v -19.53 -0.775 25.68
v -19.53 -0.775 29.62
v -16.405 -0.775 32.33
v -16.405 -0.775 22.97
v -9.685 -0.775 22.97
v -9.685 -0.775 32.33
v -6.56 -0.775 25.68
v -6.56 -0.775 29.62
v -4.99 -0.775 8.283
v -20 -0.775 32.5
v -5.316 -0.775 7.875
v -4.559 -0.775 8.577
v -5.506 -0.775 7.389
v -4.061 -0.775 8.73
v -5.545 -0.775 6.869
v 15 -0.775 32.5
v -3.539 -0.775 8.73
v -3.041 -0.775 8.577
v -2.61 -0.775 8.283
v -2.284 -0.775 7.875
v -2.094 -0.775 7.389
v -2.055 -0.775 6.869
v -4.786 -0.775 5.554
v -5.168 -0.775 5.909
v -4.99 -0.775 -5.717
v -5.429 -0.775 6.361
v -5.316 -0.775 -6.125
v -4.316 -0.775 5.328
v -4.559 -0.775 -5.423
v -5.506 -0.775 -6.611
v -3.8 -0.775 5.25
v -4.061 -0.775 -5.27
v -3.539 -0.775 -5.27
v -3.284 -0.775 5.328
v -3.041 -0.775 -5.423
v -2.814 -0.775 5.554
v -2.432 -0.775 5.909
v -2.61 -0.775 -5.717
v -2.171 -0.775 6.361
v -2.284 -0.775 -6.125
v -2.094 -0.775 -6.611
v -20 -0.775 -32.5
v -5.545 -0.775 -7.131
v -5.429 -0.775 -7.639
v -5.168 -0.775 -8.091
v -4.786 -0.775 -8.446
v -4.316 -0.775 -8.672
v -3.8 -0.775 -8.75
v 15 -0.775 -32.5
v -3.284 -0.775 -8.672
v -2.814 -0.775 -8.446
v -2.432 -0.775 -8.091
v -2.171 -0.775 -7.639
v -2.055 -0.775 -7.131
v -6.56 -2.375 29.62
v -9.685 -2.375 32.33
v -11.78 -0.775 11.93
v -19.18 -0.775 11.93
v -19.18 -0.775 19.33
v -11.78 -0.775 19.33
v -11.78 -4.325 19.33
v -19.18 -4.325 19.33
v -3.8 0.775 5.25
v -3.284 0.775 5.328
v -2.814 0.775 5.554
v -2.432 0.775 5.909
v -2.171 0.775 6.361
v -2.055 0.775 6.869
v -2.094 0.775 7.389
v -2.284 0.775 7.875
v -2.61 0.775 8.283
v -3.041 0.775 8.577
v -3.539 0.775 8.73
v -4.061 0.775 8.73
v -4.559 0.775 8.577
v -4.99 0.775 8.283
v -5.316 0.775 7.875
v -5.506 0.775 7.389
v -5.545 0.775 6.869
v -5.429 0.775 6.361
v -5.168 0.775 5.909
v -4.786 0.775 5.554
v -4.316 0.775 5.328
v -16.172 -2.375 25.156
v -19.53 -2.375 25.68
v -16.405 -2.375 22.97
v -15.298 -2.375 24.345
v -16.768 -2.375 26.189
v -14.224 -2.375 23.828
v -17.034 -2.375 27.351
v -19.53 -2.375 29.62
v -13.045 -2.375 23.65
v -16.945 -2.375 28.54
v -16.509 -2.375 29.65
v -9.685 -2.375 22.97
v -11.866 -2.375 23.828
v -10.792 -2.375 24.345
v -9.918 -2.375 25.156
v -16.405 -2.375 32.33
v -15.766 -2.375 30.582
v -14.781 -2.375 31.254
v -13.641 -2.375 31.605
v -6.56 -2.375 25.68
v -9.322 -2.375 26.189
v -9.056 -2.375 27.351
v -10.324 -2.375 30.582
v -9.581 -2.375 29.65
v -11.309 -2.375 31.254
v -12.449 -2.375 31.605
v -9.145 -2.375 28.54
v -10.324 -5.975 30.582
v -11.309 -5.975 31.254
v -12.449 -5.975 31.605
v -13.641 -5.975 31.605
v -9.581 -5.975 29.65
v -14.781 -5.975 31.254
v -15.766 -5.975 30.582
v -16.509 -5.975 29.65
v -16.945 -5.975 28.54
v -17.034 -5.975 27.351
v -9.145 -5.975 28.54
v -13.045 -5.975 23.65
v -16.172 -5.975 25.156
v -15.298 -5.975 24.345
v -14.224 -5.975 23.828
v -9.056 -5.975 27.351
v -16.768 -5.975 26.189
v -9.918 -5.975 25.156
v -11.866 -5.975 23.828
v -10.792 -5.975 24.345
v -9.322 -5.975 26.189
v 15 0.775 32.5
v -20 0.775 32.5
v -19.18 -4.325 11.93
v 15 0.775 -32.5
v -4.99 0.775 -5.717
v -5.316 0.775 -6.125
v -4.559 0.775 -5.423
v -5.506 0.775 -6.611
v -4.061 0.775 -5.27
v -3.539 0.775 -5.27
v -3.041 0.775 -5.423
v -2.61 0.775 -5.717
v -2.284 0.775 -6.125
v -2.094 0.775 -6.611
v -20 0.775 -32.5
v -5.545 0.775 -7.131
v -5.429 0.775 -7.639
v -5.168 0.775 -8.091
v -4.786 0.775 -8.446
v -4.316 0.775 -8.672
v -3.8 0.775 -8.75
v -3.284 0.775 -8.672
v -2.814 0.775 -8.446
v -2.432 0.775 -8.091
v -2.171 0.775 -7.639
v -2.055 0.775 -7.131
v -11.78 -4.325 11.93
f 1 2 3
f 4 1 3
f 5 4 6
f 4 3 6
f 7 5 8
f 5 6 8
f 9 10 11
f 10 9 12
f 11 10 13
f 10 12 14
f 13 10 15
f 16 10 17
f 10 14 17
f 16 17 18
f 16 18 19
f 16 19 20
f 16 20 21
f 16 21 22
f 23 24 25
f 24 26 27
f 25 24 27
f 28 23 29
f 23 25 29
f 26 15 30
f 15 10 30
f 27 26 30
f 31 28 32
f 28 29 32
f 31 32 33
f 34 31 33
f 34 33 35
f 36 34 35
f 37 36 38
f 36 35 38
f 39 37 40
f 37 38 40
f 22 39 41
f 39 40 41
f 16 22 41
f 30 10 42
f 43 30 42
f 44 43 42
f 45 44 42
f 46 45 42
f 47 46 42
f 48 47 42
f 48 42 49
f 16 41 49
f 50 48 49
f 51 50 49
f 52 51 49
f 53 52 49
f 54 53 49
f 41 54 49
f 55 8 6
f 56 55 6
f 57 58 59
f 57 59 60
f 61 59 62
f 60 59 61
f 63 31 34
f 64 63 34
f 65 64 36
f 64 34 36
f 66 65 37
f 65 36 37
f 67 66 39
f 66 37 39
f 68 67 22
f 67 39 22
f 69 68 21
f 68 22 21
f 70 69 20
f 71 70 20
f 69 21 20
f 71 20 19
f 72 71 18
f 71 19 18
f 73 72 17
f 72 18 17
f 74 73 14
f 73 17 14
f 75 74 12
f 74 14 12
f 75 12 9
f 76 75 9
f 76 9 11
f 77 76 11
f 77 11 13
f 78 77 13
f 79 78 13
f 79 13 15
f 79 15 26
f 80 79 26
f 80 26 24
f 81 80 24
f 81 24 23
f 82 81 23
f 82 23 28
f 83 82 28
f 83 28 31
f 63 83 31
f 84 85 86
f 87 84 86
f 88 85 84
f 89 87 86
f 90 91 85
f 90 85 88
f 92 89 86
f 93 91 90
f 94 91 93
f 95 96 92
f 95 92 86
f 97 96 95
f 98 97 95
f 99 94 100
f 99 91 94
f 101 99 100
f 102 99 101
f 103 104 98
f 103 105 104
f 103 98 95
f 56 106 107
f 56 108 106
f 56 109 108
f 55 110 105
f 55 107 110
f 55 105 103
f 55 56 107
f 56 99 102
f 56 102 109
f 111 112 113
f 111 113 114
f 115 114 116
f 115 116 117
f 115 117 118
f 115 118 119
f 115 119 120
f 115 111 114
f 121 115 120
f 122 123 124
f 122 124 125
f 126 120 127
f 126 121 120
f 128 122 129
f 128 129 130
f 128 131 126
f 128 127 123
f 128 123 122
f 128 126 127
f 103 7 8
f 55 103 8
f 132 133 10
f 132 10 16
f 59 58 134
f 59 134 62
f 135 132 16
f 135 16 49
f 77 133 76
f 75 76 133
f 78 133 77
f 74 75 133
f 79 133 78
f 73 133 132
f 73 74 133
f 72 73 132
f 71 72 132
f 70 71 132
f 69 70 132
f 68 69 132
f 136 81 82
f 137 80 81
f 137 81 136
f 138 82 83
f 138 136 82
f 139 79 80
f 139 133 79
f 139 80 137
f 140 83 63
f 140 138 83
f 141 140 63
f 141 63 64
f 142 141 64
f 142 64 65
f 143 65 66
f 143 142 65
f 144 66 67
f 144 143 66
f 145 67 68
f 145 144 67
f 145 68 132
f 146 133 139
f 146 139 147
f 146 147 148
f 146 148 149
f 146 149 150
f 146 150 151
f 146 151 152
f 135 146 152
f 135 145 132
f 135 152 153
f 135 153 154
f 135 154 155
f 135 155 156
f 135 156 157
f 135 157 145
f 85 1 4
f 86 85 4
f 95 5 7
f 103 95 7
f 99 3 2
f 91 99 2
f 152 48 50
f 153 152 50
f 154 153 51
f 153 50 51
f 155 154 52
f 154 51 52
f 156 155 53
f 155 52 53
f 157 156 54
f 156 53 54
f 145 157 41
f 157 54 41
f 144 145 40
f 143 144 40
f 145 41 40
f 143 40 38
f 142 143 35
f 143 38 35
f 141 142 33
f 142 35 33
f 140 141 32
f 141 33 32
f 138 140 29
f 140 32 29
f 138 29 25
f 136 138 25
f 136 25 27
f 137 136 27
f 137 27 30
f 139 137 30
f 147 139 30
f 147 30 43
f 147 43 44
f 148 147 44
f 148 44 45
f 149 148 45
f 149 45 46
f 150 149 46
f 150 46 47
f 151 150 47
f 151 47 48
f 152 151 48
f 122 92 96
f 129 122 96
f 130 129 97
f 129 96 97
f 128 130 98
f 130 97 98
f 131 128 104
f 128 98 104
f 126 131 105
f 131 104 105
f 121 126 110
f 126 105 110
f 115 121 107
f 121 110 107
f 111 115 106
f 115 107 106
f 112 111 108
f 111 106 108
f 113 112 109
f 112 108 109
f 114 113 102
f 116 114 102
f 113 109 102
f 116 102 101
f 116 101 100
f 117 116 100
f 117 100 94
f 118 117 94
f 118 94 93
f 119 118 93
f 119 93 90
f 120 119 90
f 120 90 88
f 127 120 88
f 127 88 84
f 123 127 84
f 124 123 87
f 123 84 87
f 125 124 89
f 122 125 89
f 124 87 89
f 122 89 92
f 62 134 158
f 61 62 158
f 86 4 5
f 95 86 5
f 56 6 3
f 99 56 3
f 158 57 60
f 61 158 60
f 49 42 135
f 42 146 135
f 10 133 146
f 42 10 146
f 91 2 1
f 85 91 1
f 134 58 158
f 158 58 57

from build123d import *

# Parameters (mm, degrees)
SKETCH1_W           = 35
SKETCH1_H           = 65
BOSS_EXTRUDE1_DEPTH = 0.775
SKETCH2_R           = 1.75
CUT_EXTRUDE1_DEPTH  = 39.192309435
SKETCH3_W           = 7.4
SKETCH3_H           = 7.4
BOSS_EXTRUDE2_DEPTH = 3.55
BOSS_EXTRUDE3_DEPTH = 1.6
SKETCH5_R           = 4
BOSS_EXTRUDE4_DEPTH = 3.6


with BuildPart() as part:
    # Sketch1 → Boss-Extrude1 (new, symmetric)
    with BuildSketch(Plane(origin=(0, 0, 0), x_dir=(1, 0, 0), z_dir=(0, 1, 0))):
        with Locations((-2.5, 0)):
            Rectangle(SKETCH1_W, SKETCH1_H)
    extrude(amount=BOSS_EXTRUDE1_DEPTH, both=True)

    # Sketch2 → Cut-Extrude1 (cut, through all)
    with BuildSketch(Plane.XZ.offset(0.775)):
        with Locations(Location((-3.8, 7, 0), (0, 0, 270))):
            Circle(SKETCH2_R)
        with Locations(Location((-3.8, -7, 0), (0, 0, 270))):
            Circle(SKETCH2_R)
    extrude(amount=-CUT_EXTRUDE1_DEPTH, mode=Mode.SUBTRACT)


with BuildPart() as body_2:
    # Sketch3 → Boss-Extrude2 (new body)
    with BuildSketch(Plane.XZ.offset(0.775)):
        with Locations((-15.48, 15.63)):
            Rectangle(SKETCH3_W, SKETCH3_H)
    extrude(amount=BOSS_EXTRUDE2_DEPTH)


with BuildPart() as body_3:
    # Sketch4 → Boss-Extrude3 (new body)
    with BuildSketch(Plane.XZ.offset(0.775)):
        Polygon((-19.53, 29.62), (-19.53, 25.68), (-16.405, 22.97), (-9.685, 22.97), (-6.56, 25.68), (-6.56, 29.62), (-9.685, 32.33), (-16.405, 32.33), align=None)
    extrude(amount=BOSS_EXTRUDE3_DEPTH)

    # Sketch5 → Boss-Extrude4 (add)
    with BuildSketch(Plane.XZ.offset(2.375)):
        with Locations(Location((-13.045, 27.65, 0), (0, 0, 270))):
            Circle(SKETCH5_R)
    extrude(amount=BOSS_EXTRUDE4_DEPTH)


solid = Compound([part.part, body_2.part, body_3.part])
